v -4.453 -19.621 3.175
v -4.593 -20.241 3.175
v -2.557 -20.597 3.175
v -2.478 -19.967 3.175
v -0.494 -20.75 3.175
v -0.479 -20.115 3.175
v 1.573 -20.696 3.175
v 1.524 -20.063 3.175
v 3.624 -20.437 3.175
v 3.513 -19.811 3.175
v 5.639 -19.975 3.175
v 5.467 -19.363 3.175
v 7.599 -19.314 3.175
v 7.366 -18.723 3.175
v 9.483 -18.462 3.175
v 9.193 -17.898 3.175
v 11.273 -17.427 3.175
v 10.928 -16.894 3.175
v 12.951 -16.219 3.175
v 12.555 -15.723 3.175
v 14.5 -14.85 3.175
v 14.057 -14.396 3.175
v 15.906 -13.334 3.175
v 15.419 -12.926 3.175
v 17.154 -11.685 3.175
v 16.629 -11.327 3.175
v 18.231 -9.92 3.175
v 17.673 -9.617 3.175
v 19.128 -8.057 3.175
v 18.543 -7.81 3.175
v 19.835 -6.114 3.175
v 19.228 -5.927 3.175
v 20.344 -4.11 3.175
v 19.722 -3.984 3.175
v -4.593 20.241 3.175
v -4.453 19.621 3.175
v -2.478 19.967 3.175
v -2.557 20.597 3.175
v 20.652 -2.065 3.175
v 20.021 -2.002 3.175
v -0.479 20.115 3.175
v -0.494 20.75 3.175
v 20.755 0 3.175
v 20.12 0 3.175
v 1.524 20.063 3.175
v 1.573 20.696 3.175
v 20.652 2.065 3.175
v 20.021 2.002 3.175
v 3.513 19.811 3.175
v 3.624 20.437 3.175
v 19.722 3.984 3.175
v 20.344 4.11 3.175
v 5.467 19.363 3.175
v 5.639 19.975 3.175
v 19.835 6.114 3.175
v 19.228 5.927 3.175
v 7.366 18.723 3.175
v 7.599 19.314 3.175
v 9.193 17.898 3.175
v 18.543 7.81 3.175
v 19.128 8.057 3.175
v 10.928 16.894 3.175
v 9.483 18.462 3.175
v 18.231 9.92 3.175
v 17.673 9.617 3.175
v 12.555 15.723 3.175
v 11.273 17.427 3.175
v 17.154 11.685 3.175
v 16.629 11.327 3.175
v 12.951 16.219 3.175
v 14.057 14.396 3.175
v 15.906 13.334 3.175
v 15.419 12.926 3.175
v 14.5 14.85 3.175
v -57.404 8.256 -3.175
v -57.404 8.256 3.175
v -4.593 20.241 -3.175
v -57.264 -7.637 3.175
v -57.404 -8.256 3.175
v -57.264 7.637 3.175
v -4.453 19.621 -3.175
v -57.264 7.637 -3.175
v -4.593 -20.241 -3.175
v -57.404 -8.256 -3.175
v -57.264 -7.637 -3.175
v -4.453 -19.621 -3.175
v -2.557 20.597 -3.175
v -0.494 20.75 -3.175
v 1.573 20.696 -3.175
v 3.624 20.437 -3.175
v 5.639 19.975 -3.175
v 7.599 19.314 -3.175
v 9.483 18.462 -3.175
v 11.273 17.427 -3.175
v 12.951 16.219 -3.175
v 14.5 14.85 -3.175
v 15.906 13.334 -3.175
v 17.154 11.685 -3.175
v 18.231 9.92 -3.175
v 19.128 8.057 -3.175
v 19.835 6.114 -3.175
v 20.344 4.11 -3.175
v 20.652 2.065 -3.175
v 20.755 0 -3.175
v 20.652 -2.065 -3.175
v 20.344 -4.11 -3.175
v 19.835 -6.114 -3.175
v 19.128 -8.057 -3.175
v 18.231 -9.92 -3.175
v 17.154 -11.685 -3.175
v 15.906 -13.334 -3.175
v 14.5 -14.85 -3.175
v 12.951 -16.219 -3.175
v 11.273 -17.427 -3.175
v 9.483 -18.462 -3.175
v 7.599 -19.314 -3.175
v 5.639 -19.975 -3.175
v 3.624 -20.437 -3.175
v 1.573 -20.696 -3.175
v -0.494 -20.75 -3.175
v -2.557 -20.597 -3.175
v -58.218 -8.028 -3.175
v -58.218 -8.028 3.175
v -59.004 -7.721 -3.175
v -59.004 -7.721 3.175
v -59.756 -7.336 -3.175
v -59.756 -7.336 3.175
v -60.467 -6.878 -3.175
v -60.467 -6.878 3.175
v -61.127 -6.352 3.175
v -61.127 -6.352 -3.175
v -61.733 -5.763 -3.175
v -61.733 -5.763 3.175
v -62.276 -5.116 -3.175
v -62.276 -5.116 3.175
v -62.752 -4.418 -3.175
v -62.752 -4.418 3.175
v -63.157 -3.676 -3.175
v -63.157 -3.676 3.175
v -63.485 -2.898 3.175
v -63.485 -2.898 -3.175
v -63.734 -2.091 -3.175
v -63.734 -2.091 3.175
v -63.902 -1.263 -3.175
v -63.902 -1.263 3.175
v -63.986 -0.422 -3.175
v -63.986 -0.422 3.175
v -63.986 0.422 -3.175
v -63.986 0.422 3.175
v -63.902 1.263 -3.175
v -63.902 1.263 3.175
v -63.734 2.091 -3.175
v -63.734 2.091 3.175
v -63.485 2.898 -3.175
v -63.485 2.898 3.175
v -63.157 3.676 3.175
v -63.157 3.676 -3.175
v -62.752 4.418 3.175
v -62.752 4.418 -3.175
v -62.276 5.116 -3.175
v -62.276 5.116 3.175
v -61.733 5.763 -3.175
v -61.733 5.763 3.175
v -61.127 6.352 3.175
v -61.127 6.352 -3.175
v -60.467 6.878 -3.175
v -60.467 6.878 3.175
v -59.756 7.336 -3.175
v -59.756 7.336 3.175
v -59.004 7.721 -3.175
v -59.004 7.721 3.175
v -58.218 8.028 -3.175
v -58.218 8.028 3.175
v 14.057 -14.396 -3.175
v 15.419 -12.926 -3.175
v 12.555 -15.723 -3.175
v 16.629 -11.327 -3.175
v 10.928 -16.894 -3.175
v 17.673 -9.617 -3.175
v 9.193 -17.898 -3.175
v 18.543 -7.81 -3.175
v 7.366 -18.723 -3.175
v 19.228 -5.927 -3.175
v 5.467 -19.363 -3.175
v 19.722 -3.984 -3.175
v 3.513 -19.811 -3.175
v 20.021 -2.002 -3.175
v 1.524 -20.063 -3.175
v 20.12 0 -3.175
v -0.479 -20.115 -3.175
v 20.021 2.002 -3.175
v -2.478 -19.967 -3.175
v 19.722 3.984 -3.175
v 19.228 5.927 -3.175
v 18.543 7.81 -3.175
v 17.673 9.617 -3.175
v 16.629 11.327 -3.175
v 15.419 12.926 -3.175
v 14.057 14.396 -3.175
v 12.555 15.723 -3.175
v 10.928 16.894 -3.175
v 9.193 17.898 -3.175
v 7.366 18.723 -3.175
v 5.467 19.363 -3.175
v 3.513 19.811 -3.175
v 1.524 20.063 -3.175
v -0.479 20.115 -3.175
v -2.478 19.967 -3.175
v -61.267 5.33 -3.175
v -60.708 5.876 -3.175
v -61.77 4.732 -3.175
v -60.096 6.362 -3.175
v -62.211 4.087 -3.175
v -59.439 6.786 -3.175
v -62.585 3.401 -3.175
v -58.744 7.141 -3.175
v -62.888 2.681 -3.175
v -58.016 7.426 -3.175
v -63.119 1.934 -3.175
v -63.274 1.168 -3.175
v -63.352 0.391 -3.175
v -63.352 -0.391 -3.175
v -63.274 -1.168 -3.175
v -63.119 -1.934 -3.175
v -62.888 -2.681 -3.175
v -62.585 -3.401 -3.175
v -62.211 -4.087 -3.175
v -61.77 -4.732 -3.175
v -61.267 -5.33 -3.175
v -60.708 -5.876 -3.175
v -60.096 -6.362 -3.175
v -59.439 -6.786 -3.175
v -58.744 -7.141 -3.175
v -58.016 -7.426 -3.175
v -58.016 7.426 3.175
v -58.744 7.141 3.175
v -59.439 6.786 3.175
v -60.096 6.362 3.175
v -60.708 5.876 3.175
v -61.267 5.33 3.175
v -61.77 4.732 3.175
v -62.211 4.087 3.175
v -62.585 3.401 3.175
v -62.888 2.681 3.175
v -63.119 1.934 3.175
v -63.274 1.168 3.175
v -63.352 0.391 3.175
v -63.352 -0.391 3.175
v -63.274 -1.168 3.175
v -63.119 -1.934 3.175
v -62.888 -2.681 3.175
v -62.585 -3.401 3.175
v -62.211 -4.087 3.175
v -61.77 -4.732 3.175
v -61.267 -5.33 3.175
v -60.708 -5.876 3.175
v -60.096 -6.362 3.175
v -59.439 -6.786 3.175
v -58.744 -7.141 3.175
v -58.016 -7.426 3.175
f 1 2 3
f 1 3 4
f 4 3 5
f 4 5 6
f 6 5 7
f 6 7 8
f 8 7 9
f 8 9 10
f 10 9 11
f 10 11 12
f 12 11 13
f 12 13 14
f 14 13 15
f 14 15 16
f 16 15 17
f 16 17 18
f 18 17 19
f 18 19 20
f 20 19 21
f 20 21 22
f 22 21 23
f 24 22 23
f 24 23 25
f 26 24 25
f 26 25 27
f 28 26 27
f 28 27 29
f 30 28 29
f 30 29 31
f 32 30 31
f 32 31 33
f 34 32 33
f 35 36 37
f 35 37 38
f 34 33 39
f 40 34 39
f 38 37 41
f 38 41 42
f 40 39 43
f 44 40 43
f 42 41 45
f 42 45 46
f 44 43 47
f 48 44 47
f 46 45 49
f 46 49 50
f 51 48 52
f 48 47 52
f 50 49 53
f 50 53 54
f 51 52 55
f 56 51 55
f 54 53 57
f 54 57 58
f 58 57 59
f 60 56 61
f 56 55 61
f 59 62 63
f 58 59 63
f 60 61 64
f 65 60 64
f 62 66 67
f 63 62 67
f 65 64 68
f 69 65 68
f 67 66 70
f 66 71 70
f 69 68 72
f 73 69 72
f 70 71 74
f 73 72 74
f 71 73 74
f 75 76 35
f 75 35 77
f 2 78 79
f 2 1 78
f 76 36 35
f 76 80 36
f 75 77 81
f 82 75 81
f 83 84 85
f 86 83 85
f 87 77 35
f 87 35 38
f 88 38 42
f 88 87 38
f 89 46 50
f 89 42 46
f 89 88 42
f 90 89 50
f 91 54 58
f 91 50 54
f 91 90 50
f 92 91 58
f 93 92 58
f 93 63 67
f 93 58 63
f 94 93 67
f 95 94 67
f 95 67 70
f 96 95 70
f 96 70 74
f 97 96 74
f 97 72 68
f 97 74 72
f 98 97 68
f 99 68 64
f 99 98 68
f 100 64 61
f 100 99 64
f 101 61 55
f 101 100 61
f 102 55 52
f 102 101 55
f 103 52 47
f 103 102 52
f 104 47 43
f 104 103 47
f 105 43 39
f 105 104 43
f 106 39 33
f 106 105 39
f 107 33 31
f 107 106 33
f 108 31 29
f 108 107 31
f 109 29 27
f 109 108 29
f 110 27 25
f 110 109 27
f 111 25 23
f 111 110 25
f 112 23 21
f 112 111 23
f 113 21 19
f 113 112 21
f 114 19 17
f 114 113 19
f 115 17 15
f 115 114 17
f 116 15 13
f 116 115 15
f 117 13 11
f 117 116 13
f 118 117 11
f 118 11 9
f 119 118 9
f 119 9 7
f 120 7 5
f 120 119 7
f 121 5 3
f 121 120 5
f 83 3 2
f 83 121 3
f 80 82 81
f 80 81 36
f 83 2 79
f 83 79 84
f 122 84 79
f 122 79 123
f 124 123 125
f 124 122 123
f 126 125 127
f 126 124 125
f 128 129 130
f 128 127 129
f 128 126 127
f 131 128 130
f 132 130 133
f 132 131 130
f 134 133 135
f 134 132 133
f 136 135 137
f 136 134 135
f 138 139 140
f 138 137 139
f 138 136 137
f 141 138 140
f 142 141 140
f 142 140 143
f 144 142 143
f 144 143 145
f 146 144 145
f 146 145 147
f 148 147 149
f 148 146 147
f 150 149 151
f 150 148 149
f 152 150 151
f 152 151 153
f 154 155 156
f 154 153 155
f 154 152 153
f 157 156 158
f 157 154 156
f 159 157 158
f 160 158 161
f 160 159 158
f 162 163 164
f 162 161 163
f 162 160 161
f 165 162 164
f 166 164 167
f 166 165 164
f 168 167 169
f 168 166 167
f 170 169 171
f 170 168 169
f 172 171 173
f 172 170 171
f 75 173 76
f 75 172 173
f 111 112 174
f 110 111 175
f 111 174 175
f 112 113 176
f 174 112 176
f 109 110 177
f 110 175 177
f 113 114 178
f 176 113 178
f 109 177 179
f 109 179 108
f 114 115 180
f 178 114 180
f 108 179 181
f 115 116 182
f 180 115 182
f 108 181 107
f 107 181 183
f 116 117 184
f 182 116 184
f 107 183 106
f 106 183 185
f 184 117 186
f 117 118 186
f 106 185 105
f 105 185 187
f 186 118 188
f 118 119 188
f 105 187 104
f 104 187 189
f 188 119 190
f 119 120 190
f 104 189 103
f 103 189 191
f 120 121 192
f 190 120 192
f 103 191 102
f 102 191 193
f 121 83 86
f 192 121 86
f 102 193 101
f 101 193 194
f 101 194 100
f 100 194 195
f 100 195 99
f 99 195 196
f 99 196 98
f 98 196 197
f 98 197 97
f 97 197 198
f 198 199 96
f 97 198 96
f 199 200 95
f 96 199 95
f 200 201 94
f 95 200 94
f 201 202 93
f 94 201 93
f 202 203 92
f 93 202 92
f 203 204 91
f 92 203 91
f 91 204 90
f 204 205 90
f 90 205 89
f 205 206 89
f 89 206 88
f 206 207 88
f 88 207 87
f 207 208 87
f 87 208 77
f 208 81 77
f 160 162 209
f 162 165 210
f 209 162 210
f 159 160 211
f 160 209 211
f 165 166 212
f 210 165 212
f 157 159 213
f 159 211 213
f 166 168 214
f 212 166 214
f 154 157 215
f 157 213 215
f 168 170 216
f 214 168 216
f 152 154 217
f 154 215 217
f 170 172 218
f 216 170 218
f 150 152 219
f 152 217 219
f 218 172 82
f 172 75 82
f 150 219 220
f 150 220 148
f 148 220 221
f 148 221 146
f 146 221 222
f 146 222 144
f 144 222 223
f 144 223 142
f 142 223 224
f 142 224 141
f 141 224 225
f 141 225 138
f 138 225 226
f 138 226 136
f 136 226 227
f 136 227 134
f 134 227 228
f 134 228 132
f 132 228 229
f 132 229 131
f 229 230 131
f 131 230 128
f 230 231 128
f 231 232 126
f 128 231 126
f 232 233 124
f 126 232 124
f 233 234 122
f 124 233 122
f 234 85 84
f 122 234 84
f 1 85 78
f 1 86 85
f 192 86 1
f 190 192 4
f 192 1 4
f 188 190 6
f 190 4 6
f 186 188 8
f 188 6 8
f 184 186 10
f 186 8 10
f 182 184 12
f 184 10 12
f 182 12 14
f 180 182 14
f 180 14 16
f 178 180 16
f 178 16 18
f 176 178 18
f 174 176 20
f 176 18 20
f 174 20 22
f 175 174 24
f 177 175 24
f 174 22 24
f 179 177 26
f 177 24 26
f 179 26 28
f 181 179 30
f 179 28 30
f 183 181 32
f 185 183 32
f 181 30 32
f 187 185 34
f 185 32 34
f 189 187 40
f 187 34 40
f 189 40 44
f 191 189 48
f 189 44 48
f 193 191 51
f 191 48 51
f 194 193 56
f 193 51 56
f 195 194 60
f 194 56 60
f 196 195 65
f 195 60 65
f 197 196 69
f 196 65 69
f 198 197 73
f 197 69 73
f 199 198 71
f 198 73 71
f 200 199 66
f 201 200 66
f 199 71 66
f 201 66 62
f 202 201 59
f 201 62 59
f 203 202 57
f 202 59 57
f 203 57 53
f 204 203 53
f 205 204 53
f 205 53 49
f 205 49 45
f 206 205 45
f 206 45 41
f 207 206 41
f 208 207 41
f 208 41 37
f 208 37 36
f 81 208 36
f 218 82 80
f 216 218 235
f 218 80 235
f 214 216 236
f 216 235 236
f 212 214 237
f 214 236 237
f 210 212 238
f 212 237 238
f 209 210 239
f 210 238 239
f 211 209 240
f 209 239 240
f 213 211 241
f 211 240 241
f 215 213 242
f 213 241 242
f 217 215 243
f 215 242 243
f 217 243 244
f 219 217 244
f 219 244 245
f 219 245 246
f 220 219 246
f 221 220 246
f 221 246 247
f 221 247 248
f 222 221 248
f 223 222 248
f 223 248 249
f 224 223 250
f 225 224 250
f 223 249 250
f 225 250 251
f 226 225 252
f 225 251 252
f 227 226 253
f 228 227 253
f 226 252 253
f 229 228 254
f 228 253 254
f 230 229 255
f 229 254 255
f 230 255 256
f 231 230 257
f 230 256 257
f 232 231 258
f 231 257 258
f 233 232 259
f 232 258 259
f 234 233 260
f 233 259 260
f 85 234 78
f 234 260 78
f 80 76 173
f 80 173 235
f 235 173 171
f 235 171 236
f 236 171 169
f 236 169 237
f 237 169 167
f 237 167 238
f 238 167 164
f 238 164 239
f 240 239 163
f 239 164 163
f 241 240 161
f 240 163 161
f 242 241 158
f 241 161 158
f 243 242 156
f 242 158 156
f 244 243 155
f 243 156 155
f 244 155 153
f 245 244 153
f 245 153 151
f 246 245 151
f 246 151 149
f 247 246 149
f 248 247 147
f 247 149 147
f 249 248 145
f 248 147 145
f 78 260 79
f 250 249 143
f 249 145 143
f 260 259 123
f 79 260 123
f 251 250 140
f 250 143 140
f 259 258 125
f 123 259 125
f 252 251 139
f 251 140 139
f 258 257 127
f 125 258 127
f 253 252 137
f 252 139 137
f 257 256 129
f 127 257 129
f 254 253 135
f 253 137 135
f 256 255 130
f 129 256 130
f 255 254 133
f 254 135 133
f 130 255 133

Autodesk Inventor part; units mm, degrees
sketch "Эскизная траектория" plane through (0, 0, 0) normal (0, 0, 1) x (1, 0, 0)
  arc A0 (-4.509, -19.8692) -> (-4.509, 19.8692) centre (0, 0) ccw
  arc A1 (-57.3198, 7.8846) -> (-57.3198, -7.8846) centre (-55.5305, 0) ccw
  line L0 (-57.3198, 7.8846) -> (-4.509, 19.8692)
  line L1 (-4.509, -19.8692) -> (-57.3198, -7.8846)
ref_plane "Плоскость сечения" through (-4.509, 19.8692, 0) normal (-0.9752, -0.2213, 0) x (0, 0, 1)
ref_plane "РабПлоскость2" through (0, 0, 0) normal (-1, 0, 0) x (0, 0, 1)
ref_plane "РабПлоскость3" through (-55.5305, 0, 0) normal (0.9298, -0.3681, 0) x (0, 0, 1)
sketch "Сечение" plane through (-4.509, 19.8692, 0) normal (-0.9752, -0.2213, 0) x (0, 0, 1)
  line L0 (-3.175, 0.381) -> (3.175, 0.381)
  line L1 (3.175, 0.381) -> (3.175, -0.254)
  line L2 (3.175, -0.254) -> (-3.175, -0.254)
  line L3 (-3.175, -0.254) -> (-3.175, 0.381)
  line L4 (-3.175, 0) -> (3.175, 0) construction
  point P0 (0, 0)
  point P1 (0, 0)
  dimension "d0" = 6.35
  dimension "d4" = 0.254
  dimension "d5" = 0.381
sweep "Ремень" add profiles "Сечение" path "Эскизная траектория"
equation "\"d0\" = da_B"
equation "\"d4\" = da_a"
equation "\"d5\" = da_a2"
equation "\"da_B\" = 6.35"
equation "\"da_pb\" = 2.032"
equation "\"da_L\" = 203.2"
equation "\"da_a\" = 0.254"
equation "\"da_S\" = 1.143"
equation "\"da_Beta\" = 20deg"
equation "\"da_Ht\" = 0.508"
equation "\"da_H\" = 1.143"
equation "\"da_a2\" = 0.381"
properties part number "Зубчатый ремень" material "Rubber"
